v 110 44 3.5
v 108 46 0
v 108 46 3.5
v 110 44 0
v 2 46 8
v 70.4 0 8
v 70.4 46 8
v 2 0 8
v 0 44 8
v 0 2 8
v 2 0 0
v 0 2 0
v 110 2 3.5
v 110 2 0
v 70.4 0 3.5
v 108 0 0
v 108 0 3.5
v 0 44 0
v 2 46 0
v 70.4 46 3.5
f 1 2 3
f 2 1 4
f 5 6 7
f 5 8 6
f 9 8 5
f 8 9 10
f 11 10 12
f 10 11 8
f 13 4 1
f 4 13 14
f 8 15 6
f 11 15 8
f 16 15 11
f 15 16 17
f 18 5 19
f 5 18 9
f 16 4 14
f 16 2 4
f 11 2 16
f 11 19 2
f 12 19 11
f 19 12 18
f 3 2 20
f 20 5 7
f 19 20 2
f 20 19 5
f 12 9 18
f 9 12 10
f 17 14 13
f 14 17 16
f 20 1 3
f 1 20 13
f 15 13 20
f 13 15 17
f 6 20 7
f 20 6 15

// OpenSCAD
$fn = 32;

// ----------------------------------------------------------------------
// Stepped bar: endstep, 110 x 46 x 8/3.5 mm
// ----------------------------------------------------------------------

// --- parameters (mm) ---
bar_l = 110;              // bar length, X
bar_w = 46;               // bar width, Y
plate_t = 8;              // thickness of the thick zone, Z
thin_t = 3.5;             // thickness of the thin zone
corner_c = 2;             // corner chamfer of the bar
step_cut = 4.5;           // material removed from the thin zone
step_x = 70.4;            // step position from the left end
depth_1 = 4.5;            // depth of cut 1 from the top face

profile = [[2, 0], [108, 0], [110, 2], [110, 44], [108, 46], [2, 46], [0, 44], [0, 2]];  // primary outline, 8 points, counter clockwise
void_1 = [[70.4, -1], [111, -1], [111, 47], [70.4, 47]];  // thin zone beyond the step, 4 points

// --- the one profile operation ---
difference() {
  linear_extrude(height = plate_t) polygon(points = profile);
  translate([0, 0, plate_t - depth_1])
    linear_extrude(height = depth_1 + 1) polygon(points = void_1);
}
